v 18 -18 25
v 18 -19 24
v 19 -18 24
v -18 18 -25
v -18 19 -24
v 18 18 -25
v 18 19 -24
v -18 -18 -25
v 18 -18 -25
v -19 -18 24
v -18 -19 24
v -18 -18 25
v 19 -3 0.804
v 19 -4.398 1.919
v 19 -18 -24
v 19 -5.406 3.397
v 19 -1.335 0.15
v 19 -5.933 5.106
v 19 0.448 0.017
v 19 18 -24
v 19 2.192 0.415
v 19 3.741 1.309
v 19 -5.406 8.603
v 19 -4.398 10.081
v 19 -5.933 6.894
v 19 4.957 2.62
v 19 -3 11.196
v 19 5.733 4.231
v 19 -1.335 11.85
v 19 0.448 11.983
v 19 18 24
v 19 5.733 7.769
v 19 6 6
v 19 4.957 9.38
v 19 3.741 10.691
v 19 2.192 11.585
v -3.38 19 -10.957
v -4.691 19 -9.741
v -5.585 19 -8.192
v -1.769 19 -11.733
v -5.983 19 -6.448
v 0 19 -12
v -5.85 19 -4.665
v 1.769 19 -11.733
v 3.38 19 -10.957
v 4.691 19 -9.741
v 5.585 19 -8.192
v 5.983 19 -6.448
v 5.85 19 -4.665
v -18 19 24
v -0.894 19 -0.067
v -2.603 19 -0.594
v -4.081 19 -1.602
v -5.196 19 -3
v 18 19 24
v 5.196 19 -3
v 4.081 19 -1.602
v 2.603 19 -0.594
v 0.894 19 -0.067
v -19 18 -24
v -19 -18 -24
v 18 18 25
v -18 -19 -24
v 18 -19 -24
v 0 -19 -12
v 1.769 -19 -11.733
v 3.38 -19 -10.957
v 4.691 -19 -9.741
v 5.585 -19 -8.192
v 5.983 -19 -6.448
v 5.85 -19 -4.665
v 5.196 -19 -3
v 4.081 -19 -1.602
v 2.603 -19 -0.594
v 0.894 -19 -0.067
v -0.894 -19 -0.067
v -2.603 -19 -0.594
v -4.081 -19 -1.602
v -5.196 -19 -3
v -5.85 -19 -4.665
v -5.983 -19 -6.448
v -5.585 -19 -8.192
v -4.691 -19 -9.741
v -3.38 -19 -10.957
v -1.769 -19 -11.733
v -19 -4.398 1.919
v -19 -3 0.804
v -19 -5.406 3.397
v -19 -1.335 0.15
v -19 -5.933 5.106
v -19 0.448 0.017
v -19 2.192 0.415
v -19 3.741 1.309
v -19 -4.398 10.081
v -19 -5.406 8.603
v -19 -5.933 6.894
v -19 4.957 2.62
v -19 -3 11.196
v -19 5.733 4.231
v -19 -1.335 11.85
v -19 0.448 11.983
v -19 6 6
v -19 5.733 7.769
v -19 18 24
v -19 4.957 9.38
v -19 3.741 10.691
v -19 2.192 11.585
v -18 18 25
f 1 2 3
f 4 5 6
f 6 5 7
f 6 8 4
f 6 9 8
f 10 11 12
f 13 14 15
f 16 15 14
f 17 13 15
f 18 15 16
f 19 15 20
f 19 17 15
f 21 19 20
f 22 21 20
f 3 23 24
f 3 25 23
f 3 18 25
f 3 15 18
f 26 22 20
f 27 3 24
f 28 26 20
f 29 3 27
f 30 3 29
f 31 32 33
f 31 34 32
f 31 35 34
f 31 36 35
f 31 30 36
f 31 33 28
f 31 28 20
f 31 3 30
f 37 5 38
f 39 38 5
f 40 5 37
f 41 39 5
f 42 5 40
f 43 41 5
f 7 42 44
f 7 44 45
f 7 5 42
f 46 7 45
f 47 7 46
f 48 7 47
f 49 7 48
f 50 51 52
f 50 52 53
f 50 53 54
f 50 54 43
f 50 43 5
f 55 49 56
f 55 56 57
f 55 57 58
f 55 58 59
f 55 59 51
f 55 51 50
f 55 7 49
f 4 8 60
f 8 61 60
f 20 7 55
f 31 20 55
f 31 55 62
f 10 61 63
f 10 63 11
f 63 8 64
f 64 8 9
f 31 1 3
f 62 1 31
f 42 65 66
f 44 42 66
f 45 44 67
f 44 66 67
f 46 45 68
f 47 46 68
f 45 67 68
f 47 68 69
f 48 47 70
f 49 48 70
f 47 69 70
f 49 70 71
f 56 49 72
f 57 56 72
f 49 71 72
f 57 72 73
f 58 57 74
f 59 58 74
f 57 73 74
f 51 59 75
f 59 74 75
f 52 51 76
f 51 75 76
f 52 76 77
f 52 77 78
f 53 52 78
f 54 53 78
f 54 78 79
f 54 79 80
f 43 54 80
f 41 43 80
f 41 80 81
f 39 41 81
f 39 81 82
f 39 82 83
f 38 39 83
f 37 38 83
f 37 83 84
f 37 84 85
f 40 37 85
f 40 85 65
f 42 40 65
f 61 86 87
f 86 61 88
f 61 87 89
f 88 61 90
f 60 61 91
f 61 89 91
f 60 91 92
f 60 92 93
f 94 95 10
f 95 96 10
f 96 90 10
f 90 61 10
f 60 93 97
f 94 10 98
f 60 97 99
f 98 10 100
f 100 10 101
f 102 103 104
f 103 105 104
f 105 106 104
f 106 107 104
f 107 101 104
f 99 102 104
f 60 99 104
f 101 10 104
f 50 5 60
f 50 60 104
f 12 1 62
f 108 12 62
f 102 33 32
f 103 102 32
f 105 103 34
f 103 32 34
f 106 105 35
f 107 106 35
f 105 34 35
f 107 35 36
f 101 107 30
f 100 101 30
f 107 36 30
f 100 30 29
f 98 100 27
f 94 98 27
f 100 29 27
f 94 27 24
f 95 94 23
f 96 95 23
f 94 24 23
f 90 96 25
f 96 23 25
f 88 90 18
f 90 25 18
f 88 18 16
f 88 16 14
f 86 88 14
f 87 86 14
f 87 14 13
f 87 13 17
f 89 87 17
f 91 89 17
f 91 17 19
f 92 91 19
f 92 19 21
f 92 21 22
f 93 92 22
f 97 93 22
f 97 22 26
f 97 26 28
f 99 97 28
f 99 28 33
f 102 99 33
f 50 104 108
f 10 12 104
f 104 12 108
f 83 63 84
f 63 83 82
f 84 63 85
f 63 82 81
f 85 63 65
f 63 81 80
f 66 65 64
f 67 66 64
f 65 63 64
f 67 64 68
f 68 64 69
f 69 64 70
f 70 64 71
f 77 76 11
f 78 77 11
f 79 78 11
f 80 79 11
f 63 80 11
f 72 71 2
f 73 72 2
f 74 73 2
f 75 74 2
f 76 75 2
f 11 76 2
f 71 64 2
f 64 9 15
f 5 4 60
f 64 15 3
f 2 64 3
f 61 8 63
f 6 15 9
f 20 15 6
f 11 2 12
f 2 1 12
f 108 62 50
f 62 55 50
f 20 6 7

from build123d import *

# Parameters (mm, degrees)
SKETCH_W      = 38
SKETCH_H      = 50
PAD_DEPTH     = 19
SKETCH001_R   = 6
HOLE_DEPTH    = 38.001
SKETCH002_R   = 6
HOLE001_DEPTH = 38.001
CHAMFER_SIZE  = 1


with BuildPart() as part:
    # Sketch → Pad (new body, symmetric)
    with BuildSketch(Plane.YZ):
        Rectangle(SKETCH_W, SKETCH_H)
    extrude(amount=PAD_DEPTH, both=True)

    # Sketch001 (on Face6 of Pad) → Hole (cut, through all)
    with BuildSketch(Plane.YZ.offset(19)):
        with Locations((0, 6)):
            Circle(SKETCH001_R)
    extrude(amount=-HOLE_DEPTH, mode=Mode.SUBTRACT)

    # Sketch002 (on Face2 of Hole) → Hole001 (cut, through all)
    with BuildSketch(Plane(origin=(0, -19, 0), x_dir=(0, 0, -1), z_dir=(0, -1, 0))):
        with Locations((6, 0)):
            Circle(SKETCH002_R)
    extrude(amount=-HOLE001_DEPTH, mode=Mode.SUBTRACT)

    # Chamfer
    chamfer_edges = [part.edges().sort_by_distance(p)[0] for p in [
        (-19, 0, -25),
        (0, -19, -25),
        (19, 0, -25),
        (0, 19, -25),
        (-19, -19, 0),
        (0, -19, 25),
        (-19, 0, 25),
        (-19, 19, 0),
        (0, 19, 25),
        (19, 19, 0),
        (19, -19, 0),
        (19, 0, 25),
    ]]
    chamfer(chamfer_edges, length=CHAMFER_SIZE)


solid = part.part
